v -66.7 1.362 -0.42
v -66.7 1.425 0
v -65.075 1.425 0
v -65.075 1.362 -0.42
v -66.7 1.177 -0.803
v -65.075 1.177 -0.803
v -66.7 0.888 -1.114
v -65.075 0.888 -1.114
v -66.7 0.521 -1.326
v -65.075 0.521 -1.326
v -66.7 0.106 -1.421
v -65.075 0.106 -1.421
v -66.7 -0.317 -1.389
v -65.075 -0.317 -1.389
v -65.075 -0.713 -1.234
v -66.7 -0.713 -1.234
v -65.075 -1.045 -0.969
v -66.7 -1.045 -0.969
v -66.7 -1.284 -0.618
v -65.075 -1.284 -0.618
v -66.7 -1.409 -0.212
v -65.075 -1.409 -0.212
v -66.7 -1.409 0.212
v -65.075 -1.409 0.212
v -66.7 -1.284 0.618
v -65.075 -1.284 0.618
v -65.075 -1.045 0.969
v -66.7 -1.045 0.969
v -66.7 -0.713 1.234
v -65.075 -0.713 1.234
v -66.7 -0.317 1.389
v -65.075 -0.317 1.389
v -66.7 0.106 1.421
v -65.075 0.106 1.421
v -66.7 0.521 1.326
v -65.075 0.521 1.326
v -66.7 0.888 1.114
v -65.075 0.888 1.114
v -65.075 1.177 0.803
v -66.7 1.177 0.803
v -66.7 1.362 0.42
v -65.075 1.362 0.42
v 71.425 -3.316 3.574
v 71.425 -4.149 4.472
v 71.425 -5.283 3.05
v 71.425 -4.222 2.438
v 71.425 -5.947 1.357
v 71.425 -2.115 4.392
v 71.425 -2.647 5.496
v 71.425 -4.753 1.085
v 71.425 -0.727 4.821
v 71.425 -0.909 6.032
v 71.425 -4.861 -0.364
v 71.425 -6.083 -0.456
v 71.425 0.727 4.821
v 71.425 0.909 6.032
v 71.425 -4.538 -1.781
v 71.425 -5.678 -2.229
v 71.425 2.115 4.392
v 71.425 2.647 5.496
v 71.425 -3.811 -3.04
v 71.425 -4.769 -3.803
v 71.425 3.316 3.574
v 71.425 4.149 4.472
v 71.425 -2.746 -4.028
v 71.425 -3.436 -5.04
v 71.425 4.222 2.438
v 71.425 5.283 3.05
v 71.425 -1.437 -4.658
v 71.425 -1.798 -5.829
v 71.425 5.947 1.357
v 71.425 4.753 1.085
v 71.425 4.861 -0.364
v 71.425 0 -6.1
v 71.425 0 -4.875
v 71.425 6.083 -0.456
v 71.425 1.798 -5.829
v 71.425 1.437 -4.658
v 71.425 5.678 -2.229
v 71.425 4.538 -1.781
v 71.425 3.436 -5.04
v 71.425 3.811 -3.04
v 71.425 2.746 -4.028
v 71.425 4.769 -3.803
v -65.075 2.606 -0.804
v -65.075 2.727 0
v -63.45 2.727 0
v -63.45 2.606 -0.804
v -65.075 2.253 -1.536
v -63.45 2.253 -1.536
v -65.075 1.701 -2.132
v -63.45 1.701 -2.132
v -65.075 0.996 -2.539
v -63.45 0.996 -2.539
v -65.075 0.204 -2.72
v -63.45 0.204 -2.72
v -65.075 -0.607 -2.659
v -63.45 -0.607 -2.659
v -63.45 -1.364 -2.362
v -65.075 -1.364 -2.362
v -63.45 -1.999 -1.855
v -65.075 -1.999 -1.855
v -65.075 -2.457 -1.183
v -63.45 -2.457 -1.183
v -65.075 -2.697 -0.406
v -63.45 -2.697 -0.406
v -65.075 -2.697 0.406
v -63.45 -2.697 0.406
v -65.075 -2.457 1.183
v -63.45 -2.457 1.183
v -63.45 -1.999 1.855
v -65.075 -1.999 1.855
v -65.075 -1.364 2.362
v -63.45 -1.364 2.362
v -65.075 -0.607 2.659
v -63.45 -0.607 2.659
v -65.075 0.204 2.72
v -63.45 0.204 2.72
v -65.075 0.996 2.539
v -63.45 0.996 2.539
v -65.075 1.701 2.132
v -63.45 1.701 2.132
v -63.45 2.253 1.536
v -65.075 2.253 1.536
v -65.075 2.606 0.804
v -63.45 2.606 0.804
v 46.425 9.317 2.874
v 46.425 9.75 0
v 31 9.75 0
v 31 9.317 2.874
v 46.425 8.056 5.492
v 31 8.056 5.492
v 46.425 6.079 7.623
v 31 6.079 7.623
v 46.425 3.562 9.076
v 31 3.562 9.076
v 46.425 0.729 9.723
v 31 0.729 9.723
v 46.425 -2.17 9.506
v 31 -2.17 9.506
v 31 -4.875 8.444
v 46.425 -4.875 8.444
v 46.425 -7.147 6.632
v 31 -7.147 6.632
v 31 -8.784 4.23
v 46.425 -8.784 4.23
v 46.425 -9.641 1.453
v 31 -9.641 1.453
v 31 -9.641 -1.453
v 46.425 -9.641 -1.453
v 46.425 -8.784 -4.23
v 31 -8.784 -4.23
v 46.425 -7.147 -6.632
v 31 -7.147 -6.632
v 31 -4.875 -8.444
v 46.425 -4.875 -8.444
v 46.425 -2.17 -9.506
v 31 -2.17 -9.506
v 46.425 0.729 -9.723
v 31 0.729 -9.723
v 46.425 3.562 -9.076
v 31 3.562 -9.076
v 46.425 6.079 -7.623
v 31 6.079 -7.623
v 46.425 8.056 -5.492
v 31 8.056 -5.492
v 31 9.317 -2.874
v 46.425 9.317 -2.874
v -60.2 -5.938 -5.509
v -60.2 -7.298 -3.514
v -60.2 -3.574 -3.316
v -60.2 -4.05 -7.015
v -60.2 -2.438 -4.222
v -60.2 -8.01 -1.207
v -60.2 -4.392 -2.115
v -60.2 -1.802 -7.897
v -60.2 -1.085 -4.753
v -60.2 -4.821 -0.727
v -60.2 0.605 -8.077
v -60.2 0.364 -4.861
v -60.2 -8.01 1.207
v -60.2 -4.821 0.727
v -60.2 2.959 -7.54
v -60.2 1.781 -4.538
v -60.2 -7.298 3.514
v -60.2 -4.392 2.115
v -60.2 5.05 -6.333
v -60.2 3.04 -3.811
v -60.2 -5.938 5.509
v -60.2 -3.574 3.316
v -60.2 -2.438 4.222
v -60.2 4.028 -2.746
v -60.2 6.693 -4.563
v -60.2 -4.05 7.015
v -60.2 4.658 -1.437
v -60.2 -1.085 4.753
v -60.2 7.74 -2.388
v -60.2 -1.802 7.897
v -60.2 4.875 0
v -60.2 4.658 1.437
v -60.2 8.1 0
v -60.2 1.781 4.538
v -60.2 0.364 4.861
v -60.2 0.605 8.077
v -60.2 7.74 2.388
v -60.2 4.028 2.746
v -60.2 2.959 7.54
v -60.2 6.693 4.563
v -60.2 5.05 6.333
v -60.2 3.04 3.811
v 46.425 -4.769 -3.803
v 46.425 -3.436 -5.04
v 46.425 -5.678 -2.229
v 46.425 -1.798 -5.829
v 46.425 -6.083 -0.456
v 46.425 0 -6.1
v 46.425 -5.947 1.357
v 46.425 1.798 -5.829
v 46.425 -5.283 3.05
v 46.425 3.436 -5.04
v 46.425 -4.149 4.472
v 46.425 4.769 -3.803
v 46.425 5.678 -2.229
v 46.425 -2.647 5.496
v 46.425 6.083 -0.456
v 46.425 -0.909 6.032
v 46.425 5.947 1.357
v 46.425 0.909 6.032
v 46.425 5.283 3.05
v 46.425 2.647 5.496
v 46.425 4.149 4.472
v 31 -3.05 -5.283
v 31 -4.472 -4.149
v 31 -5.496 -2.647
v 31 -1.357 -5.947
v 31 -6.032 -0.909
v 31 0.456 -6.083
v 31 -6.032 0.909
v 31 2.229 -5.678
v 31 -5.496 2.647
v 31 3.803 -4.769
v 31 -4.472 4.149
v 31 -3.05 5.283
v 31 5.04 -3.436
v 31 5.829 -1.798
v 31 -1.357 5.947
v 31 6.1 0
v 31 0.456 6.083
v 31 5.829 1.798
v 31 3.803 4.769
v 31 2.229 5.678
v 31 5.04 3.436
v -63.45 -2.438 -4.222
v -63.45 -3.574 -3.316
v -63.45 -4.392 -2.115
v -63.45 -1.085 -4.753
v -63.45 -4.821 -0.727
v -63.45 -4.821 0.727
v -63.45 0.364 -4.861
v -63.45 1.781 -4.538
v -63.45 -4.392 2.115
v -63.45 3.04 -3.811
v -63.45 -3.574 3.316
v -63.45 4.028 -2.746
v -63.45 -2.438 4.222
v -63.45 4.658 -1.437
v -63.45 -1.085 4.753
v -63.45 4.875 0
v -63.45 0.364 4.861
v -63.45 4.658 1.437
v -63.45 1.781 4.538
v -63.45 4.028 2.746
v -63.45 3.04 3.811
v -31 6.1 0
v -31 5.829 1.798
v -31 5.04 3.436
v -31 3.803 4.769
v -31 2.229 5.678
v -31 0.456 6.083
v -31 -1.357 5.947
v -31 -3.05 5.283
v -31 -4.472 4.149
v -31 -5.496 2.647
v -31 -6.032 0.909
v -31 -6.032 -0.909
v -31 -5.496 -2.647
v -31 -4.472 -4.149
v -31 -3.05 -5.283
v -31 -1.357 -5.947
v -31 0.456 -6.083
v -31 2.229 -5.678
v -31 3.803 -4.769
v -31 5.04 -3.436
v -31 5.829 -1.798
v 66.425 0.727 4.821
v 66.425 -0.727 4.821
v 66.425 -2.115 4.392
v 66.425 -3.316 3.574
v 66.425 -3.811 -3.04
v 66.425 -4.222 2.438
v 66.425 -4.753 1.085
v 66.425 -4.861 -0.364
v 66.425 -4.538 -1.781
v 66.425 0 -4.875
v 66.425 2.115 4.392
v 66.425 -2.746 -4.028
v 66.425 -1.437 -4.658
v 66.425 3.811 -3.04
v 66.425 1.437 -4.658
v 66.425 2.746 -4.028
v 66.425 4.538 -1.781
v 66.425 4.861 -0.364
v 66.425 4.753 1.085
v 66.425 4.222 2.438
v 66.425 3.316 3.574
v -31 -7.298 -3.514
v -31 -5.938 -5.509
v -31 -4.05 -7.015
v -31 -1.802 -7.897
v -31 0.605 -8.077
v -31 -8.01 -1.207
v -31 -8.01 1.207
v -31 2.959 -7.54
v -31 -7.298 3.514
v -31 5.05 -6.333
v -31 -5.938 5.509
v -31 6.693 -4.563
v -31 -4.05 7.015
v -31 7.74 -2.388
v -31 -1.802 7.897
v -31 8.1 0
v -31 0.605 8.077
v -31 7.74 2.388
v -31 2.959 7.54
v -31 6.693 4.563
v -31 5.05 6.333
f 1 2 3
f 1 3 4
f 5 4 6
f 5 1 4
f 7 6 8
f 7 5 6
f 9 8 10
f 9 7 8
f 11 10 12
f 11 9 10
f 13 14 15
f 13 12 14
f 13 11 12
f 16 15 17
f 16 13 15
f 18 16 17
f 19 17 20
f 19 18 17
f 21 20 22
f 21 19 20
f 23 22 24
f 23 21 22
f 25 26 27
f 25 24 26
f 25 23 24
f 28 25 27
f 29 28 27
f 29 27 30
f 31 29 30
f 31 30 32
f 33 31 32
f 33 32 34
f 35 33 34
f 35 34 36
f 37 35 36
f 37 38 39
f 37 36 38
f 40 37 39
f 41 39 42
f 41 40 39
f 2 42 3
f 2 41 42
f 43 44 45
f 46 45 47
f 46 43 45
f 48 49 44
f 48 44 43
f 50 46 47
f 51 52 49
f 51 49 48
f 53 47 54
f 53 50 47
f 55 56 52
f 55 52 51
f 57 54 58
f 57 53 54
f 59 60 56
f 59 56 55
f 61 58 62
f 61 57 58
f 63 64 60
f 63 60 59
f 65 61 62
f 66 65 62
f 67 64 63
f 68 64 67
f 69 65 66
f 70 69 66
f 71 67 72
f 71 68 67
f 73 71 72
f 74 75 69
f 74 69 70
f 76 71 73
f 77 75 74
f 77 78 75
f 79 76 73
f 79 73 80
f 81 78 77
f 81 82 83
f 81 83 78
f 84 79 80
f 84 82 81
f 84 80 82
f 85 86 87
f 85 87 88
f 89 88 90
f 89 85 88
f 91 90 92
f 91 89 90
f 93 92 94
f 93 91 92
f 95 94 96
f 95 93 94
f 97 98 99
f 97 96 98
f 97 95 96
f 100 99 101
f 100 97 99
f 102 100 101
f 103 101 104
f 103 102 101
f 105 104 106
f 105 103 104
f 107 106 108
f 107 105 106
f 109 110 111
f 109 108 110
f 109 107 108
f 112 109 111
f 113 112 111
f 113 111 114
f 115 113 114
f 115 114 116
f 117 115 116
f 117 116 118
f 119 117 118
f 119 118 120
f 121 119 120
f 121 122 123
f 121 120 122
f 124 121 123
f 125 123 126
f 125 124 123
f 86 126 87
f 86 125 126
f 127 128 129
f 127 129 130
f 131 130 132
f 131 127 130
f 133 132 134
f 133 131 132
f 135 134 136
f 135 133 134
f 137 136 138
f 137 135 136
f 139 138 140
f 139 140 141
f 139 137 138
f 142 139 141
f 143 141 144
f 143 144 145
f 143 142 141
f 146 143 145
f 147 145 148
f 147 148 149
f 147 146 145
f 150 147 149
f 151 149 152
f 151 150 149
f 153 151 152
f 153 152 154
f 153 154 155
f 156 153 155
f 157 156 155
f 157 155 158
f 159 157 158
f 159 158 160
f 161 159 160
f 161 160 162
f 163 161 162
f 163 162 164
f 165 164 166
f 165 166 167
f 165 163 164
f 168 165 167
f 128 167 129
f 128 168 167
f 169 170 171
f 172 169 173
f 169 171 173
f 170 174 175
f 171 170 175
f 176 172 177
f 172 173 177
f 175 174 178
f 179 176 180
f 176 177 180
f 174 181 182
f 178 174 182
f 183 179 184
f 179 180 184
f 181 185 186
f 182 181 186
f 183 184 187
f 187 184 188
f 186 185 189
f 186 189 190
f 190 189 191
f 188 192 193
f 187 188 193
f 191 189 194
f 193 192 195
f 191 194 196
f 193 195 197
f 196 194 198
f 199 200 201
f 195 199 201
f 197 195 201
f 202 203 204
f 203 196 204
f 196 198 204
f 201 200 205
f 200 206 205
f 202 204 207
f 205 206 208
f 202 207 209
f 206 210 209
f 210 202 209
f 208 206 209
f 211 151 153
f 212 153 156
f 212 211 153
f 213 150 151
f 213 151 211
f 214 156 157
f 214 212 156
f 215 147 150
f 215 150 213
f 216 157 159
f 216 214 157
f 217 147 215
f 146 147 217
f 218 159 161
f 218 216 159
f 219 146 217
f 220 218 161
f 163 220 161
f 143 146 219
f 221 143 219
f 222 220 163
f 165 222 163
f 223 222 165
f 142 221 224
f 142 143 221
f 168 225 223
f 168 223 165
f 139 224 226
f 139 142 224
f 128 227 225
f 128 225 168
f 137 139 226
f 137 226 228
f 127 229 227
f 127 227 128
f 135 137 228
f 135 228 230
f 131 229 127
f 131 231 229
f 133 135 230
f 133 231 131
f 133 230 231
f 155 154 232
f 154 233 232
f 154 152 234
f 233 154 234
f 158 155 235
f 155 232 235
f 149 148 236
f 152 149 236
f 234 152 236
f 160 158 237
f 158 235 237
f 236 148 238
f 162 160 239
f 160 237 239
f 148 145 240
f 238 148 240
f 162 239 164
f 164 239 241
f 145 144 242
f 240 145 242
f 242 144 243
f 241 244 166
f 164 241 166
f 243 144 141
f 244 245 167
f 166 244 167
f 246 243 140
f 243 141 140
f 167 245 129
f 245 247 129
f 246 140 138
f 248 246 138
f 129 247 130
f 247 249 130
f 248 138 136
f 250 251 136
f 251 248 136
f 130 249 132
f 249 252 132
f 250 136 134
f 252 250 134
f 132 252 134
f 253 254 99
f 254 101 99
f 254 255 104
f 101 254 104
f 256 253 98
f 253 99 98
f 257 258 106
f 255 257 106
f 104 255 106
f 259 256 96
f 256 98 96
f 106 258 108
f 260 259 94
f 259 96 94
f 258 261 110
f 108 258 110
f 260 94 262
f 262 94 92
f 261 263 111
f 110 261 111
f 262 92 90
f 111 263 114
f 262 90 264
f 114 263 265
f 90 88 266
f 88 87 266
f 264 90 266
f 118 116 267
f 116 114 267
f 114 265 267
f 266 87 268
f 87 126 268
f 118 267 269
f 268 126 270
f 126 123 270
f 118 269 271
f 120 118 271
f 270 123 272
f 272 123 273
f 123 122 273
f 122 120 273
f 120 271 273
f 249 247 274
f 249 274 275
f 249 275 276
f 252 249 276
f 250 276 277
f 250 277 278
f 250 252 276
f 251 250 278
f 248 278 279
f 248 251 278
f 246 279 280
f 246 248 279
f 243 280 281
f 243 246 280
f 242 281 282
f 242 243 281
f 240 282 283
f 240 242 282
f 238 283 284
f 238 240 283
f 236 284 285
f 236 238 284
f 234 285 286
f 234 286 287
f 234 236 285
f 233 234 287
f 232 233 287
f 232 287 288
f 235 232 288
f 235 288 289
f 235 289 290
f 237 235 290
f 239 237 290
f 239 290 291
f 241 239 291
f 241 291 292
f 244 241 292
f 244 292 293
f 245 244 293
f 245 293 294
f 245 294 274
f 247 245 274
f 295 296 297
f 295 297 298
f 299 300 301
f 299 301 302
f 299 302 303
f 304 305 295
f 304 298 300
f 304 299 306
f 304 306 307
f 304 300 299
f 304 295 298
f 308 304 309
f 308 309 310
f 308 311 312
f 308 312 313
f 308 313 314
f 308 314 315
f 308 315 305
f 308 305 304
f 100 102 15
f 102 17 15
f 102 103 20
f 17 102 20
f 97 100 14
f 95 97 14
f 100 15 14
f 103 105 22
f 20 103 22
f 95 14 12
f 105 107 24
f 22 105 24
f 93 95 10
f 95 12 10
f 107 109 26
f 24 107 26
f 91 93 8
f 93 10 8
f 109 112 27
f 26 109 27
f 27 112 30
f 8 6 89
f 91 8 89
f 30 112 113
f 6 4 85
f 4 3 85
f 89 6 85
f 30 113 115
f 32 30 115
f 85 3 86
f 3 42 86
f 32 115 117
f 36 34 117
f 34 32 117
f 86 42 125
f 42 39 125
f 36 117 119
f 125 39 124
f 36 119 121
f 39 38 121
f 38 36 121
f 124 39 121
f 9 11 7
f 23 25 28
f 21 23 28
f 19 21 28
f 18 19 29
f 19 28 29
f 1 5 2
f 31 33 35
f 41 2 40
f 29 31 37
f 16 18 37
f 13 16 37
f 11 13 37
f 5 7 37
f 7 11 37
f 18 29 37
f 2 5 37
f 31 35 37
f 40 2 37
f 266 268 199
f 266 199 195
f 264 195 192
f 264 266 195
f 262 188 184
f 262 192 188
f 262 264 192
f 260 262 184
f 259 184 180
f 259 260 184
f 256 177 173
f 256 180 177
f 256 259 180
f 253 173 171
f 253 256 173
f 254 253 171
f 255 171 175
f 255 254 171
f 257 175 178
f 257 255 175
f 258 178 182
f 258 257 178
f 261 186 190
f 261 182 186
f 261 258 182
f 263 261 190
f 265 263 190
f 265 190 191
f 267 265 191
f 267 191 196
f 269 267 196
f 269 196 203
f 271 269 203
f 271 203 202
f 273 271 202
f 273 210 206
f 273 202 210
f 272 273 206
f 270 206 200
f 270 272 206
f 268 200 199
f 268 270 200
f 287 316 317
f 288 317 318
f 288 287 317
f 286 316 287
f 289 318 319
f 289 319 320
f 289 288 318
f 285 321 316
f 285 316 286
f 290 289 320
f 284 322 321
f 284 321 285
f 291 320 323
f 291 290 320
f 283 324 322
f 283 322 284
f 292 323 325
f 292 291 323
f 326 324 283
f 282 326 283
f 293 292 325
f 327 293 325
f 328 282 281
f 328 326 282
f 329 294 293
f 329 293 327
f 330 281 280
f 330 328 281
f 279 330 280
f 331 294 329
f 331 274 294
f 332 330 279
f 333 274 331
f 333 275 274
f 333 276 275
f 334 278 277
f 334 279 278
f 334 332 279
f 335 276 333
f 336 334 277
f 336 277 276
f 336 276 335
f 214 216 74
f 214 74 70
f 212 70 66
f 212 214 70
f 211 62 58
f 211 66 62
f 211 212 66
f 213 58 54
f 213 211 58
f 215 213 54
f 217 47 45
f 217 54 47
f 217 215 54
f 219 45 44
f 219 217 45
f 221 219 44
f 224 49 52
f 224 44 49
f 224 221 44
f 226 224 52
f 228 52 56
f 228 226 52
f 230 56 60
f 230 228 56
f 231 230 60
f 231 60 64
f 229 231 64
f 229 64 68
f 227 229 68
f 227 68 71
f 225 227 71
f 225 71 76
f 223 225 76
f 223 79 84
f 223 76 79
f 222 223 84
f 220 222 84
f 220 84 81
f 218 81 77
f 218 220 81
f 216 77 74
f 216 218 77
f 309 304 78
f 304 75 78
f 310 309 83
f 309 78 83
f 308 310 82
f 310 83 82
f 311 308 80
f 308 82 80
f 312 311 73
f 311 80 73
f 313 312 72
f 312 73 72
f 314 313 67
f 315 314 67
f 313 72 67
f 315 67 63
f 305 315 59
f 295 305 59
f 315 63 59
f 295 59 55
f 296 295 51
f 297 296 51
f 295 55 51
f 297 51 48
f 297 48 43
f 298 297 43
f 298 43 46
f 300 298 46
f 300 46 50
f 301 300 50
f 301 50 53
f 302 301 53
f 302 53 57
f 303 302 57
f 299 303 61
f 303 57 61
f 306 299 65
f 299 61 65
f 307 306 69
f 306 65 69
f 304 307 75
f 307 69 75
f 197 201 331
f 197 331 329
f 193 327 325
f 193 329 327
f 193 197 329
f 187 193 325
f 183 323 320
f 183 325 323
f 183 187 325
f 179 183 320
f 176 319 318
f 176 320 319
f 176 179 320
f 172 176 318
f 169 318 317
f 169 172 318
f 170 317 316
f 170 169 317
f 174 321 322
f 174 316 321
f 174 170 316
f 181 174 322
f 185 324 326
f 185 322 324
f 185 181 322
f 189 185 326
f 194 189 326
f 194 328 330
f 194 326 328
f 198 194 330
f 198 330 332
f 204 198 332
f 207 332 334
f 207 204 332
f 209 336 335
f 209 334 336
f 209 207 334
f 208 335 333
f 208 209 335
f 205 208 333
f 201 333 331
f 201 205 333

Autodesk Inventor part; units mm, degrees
ref_plane "YZ Plane" through (0, 0, 0) normal (1, 0, 0) x (0, 1, 0)
ref_plane "XZ Plane" through (0, 0, 0) normal (0, 1, 0) x (-1, 0, 0)
ref_plane "XY Plane" through (0, 0, 0) normal (0, 0, 1) x (1, 0, 0)
sketch "Sketch1" plane through (0, 0, 0) normal (0, 0, 1) x (1, 0, 0)
  line L0 (-31, 6.1) -> (0, 6.1)
  line L1 (0, 6.1) -> (31, 6.1)
  line L2 (0, 10.5424) -> (0, 0) construction
  line L3 (31, 9.75) -> (31, 6.1)
  line L4 (77, 9.75) -> (77, 0)
  line L5 (46.4247, 9.75) -> (46.4247, 4.1503)
  line L6 (46.4247, 4.1503) -> (48.4247, 4.1503)
  line L7 (48.4247, 4.1503) -> (48.4247, 9.75)
  line L8 (31, 9.75) -> (46.4247, 9.75) construction
  line L9 (31, 9.75) -> (46.4247, 9.75)
  line L10 (62.7124, 9.75) -> (62.7124, 9.1289)
  line L11 (62.7124, 9.1289) -> (62.9117, 9.1289)
  line L12 (62.9117, 9.1289) -> (62.9117, 9.75)
  line L13 (48.4247, 9.75) -> (62.7124, 9.75) construction
  line L14 (62.9117, 9.75) -> (77, 9.75) construction
  line L15 (48.4247, 9.75) -> (62.7124, 9.75)
  line L16 (62.9117, 9.75) -> (77, 9.75)
  line L17 (-31, 8.1) -> (-60.2, 8.1)
  line L18 (-60.2, 8.1) -> (-60.2, 0)
  line L19 (-31, 8.1) -> (-31, 6.1)
  line L20 (-60.2, 4.875) -> (-63.45, 4.875)
  line L21 (-66.7, 0) -> (-60.2, 0)
  line L22 (-63.45, 4.875) -> (-63.45, 2.7274)
  line L23 (-63.45, 2.7274) -> (-65.075, 2.7274)
  line L24 (-65.075, 2.7274) -> (-65.075, 1.425)
  line L25 (-65.075, 1.425) -> (-66.7, 1.425)
  line L26 (-66.7, 1.425) -> (-66.7, 0)
  line L27 (-60.2, 0) -> (77, 0)
  line L28 (-95.44, 0) -> (105.74, 0) projected
  dimension "d1" = 31
  dimension "d2" = 31
  dimension "d3" = 6.1
  dimension "d4" = 46
  dimension "d6" = 2
  dimension "d7" = 29.2
  dimension "d8" = 8.1
  dimension "d10" = 1.425
  dimension "d11" = 6.5
revolve "Revolution1" add sketch "Sketch1" angle 360 about axis through (-10, 0, 0) along (1, 0, 0)
sketch "Sketch2" plane through (77, 0, 0) normal (1, 0, 0) x (0, 0, -1)
  circle A0 centre (0, 0) radius 9.75 projected
extrude "Extrusion1" cut sketch "Sketch2" against normal up to surface (30.5753 mm away)
sketch "Sketch3" plane through (46.4247, 0, 0) normal (1, 0, 0) x (0, 0, -1)
  circle A0 centre (0, 0) radius 6.1
  dimension "d15" = 12.2
extrude "Extrusion2" add sketch "Sketch3" along normal blind 25
sketch "Sketch4" plane through (71.4247, 0, 0) normal (1, 0, 0) x (0, 0, -1)
  circle A0 centre (0, 0) radius 4.875
  circle A1 centre (0, 0) radius 6.1 projected
  line L0 (0, 0) -> (0, 10.6003)
  line L1 (0, 0) -> (6.8931, 6.8955)
  circle A2 centre (0, 0) radius 9.75 projected
  circle A3 centre (0, 0) radius 8.1
  circle A4 centre (0, 0) radius 9.75
extrude "Extrusion3" cut sketch "Sketch4" against normal blind 5 contours A0 L0 L1 | L1 L0 A0
properties part number "PH Monitor"
